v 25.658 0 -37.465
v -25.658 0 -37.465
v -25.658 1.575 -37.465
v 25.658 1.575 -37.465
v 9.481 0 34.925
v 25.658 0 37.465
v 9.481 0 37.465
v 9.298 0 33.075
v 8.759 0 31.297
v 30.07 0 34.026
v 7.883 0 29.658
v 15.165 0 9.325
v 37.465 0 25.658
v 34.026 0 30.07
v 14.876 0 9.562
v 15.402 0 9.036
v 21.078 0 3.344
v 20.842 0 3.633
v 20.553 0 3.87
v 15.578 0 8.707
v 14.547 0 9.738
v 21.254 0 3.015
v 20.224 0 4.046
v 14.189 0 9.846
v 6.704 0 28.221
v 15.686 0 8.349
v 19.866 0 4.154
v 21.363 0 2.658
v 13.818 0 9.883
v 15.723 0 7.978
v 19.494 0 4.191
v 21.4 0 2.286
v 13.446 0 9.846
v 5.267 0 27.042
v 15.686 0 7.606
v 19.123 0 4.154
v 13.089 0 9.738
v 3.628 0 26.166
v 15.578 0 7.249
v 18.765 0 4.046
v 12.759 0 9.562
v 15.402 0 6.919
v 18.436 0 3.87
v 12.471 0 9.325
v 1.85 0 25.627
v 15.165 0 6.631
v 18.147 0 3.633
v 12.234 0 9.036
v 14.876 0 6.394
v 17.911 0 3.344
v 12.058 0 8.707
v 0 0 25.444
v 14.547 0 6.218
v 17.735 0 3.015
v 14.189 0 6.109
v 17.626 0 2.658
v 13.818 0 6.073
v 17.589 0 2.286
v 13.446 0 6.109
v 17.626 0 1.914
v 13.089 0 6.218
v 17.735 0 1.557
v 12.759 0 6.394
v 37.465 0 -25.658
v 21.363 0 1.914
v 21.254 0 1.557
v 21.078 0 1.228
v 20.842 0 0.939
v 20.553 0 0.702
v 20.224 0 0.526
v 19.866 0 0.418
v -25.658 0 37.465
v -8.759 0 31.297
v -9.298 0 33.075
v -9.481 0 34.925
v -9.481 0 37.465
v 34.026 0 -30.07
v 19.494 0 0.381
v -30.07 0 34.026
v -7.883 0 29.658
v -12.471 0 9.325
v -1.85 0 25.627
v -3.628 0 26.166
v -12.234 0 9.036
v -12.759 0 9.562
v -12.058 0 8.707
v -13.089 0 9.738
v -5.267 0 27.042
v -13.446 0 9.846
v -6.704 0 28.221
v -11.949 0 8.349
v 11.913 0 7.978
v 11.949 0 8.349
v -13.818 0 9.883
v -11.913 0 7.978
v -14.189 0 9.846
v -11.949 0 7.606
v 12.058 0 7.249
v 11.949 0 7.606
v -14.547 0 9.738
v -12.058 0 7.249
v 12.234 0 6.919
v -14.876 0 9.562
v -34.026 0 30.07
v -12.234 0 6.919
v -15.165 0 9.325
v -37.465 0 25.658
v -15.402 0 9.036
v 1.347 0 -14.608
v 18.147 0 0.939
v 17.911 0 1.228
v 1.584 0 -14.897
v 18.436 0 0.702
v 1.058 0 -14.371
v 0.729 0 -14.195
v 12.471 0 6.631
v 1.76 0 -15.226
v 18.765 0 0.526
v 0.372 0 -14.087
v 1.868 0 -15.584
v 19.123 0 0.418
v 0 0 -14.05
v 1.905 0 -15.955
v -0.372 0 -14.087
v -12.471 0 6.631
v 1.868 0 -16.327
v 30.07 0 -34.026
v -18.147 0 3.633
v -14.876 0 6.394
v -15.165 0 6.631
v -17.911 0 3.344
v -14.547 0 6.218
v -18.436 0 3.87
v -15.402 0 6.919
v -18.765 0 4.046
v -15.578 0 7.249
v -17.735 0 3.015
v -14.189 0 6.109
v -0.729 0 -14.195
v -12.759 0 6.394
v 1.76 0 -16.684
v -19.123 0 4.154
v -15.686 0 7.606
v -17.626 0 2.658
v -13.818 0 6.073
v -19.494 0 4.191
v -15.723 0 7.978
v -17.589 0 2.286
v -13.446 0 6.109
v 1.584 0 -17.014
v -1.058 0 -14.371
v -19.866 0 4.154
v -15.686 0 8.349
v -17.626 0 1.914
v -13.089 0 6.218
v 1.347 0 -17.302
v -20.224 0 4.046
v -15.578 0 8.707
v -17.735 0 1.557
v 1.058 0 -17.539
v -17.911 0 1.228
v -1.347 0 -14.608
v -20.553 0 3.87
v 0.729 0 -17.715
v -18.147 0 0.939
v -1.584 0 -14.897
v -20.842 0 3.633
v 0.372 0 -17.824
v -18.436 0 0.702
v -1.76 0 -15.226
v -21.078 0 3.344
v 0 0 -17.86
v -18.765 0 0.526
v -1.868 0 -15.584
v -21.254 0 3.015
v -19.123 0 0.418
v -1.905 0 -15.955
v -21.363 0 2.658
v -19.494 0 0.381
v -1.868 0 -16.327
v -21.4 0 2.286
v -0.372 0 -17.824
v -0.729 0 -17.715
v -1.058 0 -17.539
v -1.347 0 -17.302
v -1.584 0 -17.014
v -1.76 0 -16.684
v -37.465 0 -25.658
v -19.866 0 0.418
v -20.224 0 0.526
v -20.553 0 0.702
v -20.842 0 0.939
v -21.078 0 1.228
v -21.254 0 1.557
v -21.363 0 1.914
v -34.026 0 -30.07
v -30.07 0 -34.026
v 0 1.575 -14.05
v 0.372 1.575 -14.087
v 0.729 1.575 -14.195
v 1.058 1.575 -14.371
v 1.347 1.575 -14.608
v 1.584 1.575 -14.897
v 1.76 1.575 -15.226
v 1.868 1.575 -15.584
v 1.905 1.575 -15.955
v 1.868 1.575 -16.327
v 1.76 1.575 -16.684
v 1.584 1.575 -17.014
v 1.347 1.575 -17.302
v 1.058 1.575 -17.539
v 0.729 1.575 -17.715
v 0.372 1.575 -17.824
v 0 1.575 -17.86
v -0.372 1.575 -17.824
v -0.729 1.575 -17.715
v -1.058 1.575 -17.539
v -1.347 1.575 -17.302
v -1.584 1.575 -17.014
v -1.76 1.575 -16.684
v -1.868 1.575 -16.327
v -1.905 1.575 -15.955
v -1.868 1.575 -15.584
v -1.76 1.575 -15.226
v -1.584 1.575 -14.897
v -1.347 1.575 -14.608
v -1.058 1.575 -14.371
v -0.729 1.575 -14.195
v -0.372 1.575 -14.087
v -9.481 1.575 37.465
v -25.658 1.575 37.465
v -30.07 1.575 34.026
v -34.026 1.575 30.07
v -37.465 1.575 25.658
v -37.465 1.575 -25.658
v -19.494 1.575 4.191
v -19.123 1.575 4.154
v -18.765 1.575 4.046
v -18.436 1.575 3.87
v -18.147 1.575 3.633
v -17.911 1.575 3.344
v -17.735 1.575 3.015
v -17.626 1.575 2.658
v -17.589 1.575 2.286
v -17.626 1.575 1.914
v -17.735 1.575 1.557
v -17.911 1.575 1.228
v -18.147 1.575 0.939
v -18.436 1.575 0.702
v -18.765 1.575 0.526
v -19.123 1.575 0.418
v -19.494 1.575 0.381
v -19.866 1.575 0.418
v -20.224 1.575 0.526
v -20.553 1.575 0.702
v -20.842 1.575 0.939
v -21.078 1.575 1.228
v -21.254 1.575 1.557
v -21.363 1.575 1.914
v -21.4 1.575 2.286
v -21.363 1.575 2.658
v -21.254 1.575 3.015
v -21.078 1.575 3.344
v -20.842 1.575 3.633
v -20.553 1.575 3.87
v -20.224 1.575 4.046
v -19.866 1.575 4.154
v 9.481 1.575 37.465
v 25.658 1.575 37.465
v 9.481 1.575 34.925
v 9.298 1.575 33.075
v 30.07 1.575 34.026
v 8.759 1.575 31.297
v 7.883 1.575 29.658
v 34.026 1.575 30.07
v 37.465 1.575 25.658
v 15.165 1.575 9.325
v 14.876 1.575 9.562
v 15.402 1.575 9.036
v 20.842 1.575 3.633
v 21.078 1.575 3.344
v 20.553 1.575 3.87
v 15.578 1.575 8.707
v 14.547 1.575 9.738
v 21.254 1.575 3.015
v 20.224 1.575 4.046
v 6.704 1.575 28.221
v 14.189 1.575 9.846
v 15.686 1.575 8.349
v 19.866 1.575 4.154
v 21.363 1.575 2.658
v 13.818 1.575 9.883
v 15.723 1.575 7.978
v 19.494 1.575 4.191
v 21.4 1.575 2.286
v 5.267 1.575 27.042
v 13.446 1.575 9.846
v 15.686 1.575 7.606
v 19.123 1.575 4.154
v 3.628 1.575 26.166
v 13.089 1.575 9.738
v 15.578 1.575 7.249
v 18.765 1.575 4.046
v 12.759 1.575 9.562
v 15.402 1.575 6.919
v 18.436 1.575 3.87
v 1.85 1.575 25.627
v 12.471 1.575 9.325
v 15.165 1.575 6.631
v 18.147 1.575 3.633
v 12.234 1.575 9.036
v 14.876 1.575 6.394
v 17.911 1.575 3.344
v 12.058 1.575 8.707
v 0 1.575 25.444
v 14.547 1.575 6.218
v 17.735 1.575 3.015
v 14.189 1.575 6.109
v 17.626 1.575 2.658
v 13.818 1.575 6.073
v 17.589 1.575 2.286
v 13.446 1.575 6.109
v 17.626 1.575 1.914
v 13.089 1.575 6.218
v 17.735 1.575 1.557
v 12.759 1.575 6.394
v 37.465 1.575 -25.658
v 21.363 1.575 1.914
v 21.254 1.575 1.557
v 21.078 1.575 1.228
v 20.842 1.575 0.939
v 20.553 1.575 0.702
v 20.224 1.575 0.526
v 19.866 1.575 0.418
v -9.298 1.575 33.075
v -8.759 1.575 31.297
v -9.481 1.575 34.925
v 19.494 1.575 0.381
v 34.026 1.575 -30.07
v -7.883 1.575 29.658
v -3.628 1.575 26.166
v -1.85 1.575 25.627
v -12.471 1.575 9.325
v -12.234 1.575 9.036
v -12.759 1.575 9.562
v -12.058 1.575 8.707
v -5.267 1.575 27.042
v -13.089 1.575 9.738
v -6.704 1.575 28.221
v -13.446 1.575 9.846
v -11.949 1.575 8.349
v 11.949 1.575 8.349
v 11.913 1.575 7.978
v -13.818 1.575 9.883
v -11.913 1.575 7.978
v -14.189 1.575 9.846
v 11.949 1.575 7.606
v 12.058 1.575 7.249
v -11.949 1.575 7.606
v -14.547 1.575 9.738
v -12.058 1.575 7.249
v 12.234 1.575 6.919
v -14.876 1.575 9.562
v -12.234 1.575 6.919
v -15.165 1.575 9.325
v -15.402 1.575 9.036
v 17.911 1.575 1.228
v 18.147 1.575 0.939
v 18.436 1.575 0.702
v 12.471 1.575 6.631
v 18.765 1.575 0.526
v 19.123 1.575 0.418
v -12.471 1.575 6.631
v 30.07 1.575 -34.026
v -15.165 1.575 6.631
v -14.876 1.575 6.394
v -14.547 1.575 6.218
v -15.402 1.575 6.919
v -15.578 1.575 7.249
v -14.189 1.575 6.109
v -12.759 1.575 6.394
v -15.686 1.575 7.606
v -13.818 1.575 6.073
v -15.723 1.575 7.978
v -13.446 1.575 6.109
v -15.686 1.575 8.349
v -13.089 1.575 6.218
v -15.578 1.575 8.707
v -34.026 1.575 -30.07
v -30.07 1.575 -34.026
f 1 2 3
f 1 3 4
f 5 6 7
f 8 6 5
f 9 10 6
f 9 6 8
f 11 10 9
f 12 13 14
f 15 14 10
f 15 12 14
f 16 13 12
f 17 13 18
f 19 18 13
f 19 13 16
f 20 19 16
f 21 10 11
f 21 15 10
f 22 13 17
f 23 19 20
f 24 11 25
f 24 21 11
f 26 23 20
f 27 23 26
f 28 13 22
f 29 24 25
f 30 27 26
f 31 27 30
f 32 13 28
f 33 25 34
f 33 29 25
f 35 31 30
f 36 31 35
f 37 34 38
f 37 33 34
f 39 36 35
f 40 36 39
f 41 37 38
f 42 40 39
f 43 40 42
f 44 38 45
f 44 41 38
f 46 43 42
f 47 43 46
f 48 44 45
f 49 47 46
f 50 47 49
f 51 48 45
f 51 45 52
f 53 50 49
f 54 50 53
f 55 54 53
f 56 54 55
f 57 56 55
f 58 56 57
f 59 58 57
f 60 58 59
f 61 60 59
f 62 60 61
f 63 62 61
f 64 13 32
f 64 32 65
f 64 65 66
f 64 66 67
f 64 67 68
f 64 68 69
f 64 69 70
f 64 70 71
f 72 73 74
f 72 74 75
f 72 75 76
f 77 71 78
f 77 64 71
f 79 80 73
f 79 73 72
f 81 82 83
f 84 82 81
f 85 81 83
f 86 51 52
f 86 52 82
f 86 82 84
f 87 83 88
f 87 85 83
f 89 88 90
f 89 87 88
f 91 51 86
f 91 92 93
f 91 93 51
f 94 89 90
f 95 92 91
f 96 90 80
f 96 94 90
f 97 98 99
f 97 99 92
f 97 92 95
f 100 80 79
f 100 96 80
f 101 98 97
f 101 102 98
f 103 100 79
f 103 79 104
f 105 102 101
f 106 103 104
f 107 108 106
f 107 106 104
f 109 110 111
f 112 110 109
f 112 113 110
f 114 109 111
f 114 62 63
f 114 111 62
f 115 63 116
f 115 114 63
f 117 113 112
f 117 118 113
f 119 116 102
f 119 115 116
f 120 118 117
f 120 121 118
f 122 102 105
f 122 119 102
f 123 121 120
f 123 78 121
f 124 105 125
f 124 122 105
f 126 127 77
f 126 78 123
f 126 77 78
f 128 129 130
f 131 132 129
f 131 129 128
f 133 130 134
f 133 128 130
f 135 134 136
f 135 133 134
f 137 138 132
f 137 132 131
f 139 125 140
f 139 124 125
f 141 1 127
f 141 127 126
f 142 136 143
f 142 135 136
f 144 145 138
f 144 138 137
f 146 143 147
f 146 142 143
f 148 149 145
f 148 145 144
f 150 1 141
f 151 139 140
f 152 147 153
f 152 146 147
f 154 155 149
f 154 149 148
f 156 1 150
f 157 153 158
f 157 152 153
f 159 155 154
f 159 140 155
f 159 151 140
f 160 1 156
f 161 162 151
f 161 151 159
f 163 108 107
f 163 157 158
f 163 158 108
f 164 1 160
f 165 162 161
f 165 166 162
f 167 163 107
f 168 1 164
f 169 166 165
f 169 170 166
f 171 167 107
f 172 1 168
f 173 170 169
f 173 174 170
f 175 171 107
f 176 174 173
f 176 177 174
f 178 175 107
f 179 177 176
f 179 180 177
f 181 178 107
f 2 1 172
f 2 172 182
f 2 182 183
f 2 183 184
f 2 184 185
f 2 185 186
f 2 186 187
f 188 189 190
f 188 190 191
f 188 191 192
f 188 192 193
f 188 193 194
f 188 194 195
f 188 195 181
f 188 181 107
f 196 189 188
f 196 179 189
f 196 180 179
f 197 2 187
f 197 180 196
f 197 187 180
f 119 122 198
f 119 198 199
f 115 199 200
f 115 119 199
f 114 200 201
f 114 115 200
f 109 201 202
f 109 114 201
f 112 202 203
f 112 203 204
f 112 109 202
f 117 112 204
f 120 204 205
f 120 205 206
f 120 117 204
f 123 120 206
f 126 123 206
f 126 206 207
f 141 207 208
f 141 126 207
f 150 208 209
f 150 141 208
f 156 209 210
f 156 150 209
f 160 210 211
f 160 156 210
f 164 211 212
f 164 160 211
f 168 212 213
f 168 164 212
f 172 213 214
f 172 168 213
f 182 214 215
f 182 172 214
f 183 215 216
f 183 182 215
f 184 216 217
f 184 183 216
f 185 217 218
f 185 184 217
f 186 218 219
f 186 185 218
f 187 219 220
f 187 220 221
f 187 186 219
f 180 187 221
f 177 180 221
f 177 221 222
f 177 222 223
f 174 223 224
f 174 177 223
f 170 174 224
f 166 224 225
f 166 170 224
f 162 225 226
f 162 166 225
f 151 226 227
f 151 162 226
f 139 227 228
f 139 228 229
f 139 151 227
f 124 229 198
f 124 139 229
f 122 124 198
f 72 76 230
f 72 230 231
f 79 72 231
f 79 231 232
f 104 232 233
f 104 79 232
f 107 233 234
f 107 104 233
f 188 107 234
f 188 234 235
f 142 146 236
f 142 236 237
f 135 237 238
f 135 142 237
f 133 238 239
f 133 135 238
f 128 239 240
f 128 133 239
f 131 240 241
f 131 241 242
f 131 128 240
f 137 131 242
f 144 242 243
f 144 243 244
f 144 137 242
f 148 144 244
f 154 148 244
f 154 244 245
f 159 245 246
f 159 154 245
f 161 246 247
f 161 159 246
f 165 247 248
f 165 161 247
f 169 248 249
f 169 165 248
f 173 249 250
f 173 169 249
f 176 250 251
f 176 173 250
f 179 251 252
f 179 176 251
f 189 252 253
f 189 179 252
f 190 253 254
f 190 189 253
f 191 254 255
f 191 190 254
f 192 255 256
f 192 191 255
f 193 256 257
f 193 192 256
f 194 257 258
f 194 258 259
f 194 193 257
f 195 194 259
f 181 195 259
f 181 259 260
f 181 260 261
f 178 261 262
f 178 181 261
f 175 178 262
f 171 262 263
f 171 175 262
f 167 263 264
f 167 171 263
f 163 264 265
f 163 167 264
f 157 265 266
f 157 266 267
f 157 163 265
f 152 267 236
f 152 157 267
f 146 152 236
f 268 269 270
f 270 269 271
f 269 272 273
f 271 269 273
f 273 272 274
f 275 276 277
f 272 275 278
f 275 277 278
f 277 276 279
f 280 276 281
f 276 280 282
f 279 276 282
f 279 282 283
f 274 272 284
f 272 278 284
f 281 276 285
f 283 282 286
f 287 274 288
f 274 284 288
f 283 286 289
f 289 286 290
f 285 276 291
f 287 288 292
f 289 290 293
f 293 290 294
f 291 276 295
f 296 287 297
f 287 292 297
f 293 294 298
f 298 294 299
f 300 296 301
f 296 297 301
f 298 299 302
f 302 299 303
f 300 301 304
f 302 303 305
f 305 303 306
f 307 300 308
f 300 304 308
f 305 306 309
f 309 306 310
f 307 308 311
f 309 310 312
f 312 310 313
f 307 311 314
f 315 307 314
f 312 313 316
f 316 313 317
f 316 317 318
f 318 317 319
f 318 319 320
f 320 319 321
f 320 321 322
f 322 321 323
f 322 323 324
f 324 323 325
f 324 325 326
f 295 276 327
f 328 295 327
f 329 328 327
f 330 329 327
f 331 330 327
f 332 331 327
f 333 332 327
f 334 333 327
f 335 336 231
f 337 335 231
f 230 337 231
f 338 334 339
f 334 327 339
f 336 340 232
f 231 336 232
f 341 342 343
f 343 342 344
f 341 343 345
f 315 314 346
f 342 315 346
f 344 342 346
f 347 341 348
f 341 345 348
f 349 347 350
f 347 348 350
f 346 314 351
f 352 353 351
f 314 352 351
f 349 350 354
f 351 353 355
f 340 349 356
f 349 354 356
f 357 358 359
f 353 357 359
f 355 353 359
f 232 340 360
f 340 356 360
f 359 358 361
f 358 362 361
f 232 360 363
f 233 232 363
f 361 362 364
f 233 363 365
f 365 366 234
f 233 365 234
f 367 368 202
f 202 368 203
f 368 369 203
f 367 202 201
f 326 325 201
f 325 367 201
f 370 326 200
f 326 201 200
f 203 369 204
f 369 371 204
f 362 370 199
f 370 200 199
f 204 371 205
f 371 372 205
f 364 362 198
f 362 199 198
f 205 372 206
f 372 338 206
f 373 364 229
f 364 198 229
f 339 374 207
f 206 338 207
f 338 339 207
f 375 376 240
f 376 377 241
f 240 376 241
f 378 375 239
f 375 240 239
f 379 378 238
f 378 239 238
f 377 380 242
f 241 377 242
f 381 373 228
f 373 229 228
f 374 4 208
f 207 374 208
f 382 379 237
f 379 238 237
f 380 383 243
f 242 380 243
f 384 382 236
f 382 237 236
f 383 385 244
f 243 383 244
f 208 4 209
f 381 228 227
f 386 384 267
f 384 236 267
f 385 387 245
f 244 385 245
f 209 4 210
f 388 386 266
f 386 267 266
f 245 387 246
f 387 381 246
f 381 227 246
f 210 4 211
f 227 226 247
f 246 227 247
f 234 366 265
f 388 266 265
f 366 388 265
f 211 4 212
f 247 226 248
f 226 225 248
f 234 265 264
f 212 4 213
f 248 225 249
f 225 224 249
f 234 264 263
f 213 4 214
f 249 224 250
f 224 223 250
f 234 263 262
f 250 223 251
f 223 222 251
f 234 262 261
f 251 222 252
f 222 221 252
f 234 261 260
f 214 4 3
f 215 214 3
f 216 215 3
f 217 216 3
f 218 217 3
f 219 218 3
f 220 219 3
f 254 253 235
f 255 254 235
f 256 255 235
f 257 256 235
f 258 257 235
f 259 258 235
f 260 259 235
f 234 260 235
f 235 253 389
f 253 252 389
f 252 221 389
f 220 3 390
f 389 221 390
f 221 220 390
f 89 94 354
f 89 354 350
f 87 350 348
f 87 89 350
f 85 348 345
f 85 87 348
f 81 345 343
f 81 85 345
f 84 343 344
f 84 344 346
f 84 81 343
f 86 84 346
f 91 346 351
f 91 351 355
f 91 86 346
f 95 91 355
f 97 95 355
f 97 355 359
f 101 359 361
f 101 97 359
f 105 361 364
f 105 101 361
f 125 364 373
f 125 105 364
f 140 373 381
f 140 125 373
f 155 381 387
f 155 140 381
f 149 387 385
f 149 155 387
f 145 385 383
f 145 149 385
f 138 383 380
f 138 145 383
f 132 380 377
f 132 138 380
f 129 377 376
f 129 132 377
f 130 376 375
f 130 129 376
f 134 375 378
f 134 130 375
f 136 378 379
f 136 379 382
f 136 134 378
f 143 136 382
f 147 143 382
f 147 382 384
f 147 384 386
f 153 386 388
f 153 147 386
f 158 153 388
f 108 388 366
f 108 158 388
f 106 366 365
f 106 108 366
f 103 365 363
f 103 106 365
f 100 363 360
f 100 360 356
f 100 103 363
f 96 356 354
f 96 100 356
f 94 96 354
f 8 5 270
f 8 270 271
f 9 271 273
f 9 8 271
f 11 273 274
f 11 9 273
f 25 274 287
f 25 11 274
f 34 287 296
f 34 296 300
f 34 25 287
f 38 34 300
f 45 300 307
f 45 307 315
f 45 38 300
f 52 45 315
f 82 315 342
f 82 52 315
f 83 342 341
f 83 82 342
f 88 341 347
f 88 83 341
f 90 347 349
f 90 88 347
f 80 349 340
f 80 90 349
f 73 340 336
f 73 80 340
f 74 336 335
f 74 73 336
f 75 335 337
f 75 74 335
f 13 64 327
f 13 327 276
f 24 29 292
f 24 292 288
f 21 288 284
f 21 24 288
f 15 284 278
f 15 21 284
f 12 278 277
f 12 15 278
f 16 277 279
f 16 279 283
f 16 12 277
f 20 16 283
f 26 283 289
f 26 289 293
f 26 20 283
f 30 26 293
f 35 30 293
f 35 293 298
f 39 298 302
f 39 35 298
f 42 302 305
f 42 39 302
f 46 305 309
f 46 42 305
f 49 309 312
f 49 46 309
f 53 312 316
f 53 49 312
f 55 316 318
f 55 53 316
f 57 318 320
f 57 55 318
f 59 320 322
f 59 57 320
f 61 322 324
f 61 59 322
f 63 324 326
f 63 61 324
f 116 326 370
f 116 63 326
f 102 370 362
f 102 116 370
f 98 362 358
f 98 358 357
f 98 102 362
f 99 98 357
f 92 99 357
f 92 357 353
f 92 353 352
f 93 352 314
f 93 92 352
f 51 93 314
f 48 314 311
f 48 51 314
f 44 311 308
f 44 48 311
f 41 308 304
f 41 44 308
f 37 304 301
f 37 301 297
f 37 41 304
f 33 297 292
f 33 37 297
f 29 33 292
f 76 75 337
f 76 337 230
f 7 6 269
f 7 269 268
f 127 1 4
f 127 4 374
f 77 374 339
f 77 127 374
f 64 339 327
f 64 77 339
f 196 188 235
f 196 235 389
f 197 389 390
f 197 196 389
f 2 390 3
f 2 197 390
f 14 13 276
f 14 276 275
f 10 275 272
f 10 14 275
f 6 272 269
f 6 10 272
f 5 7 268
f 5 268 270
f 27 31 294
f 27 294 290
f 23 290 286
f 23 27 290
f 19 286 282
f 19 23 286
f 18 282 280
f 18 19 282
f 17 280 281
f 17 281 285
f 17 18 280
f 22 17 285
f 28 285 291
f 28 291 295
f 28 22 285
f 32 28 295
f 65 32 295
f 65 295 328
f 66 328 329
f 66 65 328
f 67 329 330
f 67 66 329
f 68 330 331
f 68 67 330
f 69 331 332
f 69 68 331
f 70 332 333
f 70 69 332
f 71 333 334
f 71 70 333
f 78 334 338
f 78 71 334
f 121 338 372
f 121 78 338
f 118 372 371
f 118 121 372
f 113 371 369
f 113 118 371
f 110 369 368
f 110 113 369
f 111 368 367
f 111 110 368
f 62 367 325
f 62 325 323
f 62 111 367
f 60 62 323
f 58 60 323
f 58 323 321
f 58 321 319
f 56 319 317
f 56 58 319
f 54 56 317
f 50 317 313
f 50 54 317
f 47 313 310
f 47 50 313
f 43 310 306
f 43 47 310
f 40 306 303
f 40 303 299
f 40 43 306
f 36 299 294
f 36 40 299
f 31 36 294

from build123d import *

# Parameters (mm, degrees)
SKETCH1_R           = 1.905
BOSS_EXTRUDE1_DEPTH = 1.5748


with BuildPart() as part:
    # Sketch1 → Boss-Extrude1 (new body)
    with BuildSketch(Plane(origin=(0, 0, 0), x_dir=(1, 0, 0), z_dir=(0, 1, 0))):
        with BuildLine():
            Line((-25.658087094, 37.465), (25.658087094, 37.465))
            ThreePointArc((25.658087094, 37.465), (32.108905761, 32.108905761), (37.465, 25.658087094))
            Line((37.465, 25.658087094), (37.465, -25.658087094))
            ThreePointArc((37.465, -25.658087094), (32.108905761, -32.108905761), (25.658087094, -37.465))
            Line((25.658087094, -37.465), (9.48055, -37.465))
            Line((9.48055, -37.465), (9.48055, -34.925))
            ThreePointArc((9.48055, -34.925), (0, -25.44445), (-9.48055, -34.925))
            Line((-9.48055, -34.925), (-9.48055, -37.465))
            Line((-9.48055, -37.465), (-25.658087094, -37.465))
            ThreePointArc((-25.658087094, -37.465), (-32.108905761, -32.108905761), (-37.465, -25.658087094))
            Line((-37.465, -25.658087094), (-37.465, 25.658087094))
            ThreePointArc((-37.465, 25.658087094), (-32.108905761, 32.108905761), (-25.658087094, 37.465))
        make_face()
        with Locations(Location((13.8176, -7.97759508, 0), (0, 0, 270))):
            Circle(SKETCH1_R, mode=Mode.SUBTRACT)
        with Locations(Location((0, 15.955190159, 0), (0, 0, 270))):
            Circle(SKETCH1_R, mode=Mode.SUBTRACT)
        with Locations(Location((-13.8176, -7.97759508, 0), (0, 0, 270))):
            Circle(SKETCH1_R, mode=Mode.SUBTRACT)
        with Locations(Location((-19.4945, -2.286, 0), (0, 0, 270))):
            Circle(SKETCH1_R, mode=Mode.SUBTRACT)
        with Locations(Location((19.4945, -2.286, 0), (0, 0, 270))):
            Circle(SKETCH1_R, mode=Mode.SUBTRACT)
    extrude(amount=BOSS_EXTRUDE1_DEPTH)


solid = part.part
